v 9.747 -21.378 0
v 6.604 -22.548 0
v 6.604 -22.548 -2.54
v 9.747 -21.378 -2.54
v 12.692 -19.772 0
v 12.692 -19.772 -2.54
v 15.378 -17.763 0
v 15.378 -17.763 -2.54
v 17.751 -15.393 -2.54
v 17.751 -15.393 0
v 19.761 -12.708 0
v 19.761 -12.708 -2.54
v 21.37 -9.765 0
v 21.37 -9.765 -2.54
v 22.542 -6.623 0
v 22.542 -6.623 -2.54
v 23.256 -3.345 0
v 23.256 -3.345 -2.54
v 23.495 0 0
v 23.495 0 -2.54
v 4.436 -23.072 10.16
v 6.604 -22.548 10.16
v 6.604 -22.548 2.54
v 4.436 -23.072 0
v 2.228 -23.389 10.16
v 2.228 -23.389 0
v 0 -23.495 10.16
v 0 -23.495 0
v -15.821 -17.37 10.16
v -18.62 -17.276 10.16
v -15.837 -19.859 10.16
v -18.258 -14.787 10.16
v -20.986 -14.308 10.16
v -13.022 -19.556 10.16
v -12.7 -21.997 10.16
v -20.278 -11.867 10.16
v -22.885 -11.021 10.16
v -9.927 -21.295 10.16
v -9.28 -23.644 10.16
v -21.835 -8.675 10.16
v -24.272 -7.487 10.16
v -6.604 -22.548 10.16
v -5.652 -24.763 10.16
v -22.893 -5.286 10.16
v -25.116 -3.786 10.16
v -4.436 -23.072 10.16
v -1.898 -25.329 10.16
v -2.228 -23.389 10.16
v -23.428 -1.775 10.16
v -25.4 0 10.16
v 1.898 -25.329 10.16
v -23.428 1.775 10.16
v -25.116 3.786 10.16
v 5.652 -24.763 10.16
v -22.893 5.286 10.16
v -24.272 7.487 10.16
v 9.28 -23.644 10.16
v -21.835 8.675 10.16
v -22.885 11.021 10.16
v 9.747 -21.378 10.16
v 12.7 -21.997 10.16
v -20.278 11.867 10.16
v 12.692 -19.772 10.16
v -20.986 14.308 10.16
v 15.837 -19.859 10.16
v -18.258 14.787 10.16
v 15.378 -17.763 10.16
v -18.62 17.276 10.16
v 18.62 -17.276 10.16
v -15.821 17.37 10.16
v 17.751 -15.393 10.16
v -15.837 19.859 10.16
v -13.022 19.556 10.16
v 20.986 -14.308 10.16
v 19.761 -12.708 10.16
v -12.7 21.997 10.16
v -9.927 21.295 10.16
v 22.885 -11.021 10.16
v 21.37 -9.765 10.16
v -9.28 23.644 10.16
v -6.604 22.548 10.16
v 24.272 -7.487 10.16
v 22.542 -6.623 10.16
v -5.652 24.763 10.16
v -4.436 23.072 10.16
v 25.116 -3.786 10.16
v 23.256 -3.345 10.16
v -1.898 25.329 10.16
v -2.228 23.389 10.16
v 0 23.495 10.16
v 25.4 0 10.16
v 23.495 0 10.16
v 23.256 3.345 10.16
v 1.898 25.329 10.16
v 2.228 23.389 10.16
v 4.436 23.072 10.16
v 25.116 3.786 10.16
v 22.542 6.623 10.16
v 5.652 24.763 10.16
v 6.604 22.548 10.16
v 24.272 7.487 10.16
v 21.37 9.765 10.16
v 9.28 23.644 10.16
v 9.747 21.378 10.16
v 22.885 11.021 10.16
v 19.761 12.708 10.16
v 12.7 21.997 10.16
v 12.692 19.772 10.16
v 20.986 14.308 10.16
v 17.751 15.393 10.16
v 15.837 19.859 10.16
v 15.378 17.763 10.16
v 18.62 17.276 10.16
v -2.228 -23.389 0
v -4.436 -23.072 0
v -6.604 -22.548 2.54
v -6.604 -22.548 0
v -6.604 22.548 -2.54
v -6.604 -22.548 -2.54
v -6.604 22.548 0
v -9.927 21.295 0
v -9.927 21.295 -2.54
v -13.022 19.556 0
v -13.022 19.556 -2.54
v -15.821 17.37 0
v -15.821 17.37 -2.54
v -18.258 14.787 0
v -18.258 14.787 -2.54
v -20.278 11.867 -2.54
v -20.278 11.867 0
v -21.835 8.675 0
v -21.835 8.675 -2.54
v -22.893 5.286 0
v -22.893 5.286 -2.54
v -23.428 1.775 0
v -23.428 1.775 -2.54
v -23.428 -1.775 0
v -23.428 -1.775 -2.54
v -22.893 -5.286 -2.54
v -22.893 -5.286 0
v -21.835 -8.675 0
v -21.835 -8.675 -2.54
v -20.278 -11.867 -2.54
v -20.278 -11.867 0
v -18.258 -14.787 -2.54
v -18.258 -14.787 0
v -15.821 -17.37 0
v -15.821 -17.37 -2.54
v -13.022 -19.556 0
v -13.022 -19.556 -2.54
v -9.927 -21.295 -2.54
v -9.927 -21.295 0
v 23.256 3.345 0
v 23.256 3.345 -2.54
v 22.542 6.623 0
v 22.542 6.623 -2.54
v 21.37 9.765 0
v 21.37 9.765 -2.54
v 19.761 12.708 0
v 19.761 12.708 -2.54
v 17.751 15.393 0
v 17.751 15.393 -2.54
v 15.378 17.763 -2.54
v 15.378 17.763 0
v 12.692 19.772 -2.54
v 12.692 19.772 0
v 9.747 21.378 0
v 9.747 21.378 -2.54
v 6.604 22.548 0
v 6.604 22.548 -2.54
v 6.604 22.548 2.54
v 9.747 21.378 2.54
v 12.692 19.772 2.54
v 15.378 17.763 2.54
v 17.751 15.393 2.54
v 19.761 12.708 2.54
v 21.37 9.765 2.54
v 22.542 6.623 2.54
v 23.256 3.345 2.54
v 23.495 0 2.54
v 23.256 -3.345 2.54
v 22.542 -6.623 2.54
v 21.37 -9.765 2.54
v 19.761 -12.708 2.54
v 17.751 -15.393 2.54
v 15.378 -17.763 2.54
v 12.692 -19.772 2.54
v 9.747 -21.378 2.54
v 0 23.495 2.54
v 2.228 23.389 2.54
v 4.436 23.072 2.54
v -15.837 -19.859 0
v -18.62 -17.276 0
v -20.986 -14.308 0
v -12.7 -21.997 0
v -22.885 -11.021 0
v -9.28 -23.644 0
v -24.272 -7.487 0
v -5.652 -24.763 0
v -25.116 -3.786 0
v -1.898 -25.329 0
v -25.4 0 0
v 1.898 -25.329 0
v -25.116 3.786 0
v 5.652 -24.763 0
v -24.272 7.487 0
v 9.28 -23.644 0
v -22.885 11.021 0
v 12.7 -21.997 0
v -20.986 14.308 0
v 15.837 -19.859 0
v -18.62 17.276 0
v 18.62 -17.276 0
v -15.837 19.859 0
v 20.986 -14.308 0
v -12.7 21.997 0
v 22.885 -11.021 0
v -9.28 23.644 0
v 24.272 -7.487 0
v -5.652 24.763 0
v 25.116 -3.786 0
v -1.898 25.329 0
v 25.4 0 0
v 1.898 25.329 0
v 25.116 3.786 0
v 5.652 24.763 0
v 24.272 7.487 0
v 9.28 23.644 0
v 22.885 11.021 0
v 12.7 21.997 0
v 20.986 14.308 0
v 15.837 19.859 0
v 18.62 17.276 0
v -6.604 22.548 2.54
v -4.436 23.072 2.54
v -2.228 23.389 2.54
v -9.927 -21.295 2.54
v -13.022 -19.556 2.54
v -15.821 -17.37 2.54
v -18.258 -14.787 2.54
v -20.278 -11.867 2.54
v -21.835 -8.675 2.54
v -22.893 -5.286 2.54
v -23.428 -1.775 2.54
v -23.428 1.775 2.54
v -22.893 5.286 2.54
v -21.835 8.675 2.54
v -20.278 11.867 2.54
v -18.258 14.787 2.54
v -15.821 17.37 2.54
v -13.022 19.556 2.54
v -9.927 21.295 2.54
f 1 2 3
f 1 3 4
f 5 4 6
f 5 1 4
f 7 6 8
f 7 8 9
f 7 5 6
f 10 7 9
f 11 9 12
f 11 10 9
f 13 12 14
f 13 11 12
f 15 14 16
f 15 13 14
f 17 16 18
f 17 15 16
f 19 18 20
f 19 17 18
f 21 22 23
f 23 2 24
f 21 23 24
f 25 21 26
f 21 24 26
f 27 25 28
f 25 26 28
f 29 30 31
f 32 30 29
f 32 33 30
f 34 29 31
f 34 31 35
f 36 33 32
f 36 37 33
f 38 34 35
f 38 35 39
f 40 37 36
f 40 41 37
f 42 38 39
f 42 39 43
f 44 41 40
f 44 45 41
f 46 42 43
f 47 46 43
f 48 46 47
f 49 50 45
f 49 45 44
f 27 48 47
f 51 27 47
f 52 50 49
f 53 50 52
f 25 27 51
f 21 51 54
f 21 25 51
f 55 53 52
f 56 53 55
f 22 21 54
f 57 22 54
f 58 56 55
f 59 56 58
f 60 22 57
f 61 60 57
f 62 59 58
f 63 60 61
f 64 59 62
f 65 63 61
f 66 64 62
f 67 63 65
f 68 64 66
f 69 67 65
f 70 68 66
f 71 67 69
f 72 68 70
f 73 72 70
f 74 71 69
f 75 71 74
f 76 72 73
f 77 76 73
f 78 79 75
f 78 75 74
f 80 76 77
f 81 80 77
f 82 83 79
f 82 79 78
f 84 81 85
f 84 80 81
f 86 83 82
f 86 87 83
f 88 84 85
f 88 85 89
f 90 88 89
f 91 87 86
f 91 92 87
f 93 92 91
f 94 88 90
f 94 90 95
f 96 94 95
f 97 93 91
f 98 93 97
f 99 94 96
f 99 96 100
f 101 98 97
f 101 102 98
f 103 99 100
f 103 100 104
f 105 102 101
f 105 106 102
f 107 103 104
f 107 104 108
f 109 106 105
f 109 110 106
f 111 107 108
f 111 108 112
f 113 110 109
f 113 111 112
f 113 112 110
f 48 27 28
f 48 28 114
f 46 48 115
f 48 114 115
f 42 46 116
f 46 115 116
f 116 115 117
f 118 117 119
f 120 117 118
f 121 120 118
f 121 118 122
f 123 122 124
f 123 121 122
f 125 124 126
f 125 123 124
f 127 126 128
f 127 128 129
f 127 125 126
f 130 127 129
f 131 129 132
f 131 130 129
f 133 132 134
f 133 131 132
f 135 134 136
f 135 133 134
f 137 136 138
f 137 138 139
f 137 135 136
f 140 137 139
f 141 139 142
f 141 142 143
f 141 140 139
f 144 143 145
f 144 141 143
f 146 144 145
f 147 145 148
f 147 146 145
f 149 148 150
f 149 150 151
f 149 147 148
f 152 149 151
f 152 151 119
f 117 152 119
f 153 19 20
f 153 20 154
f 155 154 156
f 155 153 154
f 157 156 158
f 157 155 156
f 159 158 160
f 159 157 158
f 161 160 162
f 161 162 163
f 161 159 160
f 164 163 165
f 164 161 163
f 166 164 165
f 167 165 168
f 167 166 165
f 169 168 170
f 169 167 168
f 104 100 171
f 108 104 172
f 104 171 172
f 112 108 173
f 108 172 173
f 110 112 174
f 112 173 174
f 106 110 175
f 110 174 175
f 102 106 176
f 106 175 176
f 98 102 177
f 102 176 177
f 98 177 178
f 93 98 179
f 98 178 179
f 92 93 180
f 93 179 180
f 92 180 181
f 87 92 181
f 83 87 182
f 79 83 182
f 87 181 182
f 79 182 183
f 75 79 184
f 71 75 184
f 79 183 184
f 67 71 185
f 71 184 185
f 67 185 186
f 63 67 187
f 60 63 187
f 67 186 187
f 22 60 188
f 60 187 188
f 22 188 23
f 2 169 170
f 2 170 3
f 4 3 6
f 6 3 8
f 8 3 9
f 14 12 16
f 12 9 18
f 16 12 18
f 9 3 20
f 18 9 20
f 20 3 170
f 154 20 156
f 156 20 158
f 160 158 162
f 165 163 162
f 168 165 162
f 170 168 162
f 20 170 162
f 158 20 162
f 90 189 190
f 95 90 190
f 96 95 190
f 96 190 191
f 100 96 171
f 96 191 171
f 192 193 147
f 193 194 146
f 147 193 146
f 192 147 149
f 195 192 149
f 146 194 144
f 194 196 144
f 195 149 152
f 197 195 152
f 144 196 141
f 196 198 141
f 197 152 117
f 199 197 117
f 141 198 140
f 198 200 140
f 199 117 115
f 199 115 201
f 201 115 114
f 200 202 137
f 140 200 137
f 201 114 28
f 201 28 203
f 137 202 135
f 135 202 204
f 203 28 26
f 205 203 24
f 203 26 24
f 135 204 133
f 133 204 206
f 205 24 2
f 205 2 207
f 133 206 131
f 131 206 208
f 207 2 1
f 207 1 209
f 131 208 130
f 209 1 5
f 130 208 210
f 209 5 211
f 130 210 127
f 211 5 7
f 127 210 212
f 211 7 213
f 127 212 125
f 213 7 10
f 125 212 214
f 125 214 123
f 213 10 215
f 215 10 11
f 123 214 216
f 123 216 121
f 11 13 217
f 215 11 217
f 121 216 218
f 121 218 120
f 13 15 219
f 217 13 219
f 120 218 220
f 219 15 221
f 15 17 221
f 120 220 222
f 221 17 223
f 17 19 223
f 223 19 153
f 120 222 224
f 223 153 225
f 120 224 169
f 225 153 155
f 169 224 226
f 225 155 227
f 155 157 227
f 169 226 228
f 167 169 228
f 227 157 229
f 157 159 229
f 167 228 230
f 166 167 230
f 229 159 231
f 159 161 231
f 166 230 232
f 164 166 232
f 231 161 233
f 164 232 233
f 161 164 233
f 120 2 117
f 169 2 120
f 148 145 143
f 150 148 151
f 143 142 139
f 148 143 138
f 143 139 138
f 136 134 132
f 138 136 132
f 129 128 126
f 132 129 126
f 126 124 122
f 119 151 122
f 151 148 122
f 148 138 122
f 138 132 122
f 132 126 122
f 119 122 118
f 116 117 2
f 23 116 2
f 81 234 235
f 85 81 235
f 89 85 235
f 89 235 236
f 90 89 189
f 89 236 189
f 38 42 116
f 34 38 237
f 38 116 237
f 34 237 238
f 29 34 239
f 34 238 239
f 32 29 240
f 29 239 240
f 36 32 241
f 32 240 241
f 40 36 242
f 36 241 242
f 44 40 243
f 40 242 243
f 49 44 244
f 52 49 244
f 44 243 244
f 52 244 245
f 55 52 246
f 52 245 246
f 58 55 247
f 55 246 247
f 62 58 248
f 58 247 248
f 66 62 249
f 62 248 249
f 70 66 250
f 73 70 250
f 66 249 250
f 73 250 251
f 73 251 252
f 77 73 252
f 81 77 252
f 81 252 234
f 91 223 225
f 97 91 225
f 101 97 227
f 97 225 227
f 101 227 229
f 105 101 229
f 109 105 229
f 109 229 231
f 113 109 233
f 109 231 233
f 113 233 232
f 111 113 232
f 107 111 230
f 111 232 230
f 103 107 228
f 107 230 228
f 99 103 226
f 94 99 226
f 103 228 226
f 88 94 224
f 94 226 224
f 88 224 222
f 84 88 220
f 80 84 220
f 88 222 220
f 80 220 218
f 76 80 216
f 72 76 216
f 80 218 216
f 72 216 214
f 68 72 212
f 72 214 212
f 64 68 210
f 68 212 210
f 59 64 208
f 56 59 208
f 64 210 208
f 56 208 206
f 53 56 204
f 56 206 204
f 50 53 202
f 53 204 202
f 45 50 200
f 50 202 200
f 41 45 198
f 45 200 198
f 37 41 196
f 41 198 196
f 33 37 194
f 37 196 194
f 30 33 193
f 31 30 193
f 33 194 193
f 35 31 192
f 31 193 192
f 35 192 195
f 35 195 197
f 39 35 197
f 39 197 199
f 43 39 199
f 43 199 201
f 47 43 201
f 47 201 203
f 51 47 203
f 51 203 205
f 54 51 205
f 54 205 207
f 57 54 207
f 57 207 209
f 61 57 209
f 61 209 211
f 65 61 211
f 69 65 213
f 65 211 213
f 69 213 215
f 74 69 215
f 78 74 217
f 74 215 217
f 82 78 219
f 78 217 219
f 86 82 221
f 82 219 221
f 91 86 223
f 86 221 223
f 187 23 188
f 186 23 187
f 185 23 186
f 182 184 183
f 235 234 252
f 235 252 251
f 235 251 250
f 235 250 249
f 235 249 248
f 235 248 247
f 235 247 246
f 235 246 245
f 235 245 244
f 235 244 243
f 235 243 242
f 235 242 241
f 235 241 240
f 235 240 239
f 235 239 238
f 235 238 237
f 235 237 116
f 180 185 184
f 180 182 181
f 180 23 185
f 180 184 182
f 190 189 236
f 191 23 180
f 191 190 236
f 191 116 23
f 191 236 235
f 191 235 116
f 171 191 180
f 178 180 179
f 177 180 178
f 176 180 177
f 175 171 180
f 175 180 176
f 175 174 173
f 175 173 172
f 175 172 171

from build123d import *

# Parameters (mm, degrees)
F0_R     = 25.4
F1_DEPTH = 10.16
F2_DEPTH = 2.54
F3_DEPTH = 2.54


with BuildPart() as f1:
    # F0 (on Top) → F1 (new body)
    with BuildSketch(Plane.XY):
        Circle(F0_R)
        with BuildLine():
            ThreePointArc((0, -23.495), (-3.3357925983, -23.256988471), (-6.604, -22.5477761431))
            ThreePointArc((-6.604, -22.5477761431), (-23.495, 0), (-6.604, 22.5477761431))
            Line((-6.604, 22.5477761431), (-6.604, 23.495))
            Line((-6.604, 23.495), (0, 23.495))
            Line((0, 23.495), (6.604, 23.495))
            Line((6.604, 23.495), (6.604, 22.5477761431))
            ThreePointArc((6.604, 22.5477761431), (18.8039358247, 14.086412691), (23.495, 0))
            ThreePointArc((23.495, 0), (18.8039358247, -14.086412691), (6.604, -22.5477761431))
            ThreePointArc((6.604, -22.5477761431), (3.3357925983, -23.256988471), (0, -23.495))
        make_face(mode=Mode.SUBTRACT)
        with BuildLine():
            Line((-6.604, 23.495), (-6.604, 22.5477761431))
            ThreePointArc((-6.604, 22.5477761431), (-3.3357925983, 23.256988471), (0, 23.495))
            Line((0, 23.495), (-6.604, 23.495))
        make_face()
        with BuildLine():
            Line((6.604, 23.495), (0, 23.495))
            ThreePointArc((0, 23.495), (3.3357925983, 23.256988471), (6.604, 22.5477761431))
            Line((6.604, 22.5477761431), (6.604, 23.495))
        make_face()
    extrude(amount=F1_DEPTH)

    # F0 (on Top) → F2 (join)
    with BuildSketch(Plane.XY):
        with BuildLine():
            ThreePointArc((-6.604, 22.5477761431), (-23.495, 0), (-6.604, -22.5477761431))
            Line((-6.604, -22.5477761431), (-6.604, 22.5477761431))
        make_face()
        with BuildLine():
            Line((-6.604, 22.5477761431), (-6.604, -22.5477761431))
            Line((-6.604, -22.5477761431), (0, -22.5477761431))
            Line((0, -22.5477761431), (0, 23.495))
            ThreePointArc((0, 23.495), (-3.3357925983, 23.256988471), (-6.604, 22.5477761431))
        make_face()
        with BuildLine():
            Line((0, 23.495), (0, -22.5477761431))
            Line((0, -22.5477761431), (6.604, -22.5477761431))
            Line((6.604, -22.5477761431), (6.604, 22.5477761431))
            ThreePointArc((6.604, 22.5477761431), (3.3357925983, 23.256988471), (0, 23.495))
        make_face()
        with BuildLine():
            Line((6.604, 22.5477761431), (6.604, -22.5477761431))
            ThreePointArc((6.604, -22.5477761431), (18.8039358247, -14.086412691), (23.495, 0))
            ThreePointArc((23.495, 0), (18.8039358247, 14.086412691), (6.604, 22.5477761431))
        make_face()
    extrude(amount=F2_DEPTH)

    # F0 (on Top) → F3 (join)
    with BuildSketch(Plane.XY):
        with BuildLine():
            ThreePointArc((-6.604, 22.5477761431), (-23.495, 0), (-6.604, -22.5477761431))
            Line((-6.604, -22.5477761431), (-6.604, 22.5477761431))
        make_face()
        with BuildLine():
            Line((6.604, 22.5477761431), (6.604, -22.5477761431))
            ThreePointArc((6.604, -22.5477761431), (18.8039358247, -14.086412691), (23.495, 0))
            ThreePointArc((23.495, 0), (18.8039358247, 14.086412691), (6.604, 22.5477761431))
        make_face()
    extrude(amount=-F3_DEPTH)


solid = f1.part
